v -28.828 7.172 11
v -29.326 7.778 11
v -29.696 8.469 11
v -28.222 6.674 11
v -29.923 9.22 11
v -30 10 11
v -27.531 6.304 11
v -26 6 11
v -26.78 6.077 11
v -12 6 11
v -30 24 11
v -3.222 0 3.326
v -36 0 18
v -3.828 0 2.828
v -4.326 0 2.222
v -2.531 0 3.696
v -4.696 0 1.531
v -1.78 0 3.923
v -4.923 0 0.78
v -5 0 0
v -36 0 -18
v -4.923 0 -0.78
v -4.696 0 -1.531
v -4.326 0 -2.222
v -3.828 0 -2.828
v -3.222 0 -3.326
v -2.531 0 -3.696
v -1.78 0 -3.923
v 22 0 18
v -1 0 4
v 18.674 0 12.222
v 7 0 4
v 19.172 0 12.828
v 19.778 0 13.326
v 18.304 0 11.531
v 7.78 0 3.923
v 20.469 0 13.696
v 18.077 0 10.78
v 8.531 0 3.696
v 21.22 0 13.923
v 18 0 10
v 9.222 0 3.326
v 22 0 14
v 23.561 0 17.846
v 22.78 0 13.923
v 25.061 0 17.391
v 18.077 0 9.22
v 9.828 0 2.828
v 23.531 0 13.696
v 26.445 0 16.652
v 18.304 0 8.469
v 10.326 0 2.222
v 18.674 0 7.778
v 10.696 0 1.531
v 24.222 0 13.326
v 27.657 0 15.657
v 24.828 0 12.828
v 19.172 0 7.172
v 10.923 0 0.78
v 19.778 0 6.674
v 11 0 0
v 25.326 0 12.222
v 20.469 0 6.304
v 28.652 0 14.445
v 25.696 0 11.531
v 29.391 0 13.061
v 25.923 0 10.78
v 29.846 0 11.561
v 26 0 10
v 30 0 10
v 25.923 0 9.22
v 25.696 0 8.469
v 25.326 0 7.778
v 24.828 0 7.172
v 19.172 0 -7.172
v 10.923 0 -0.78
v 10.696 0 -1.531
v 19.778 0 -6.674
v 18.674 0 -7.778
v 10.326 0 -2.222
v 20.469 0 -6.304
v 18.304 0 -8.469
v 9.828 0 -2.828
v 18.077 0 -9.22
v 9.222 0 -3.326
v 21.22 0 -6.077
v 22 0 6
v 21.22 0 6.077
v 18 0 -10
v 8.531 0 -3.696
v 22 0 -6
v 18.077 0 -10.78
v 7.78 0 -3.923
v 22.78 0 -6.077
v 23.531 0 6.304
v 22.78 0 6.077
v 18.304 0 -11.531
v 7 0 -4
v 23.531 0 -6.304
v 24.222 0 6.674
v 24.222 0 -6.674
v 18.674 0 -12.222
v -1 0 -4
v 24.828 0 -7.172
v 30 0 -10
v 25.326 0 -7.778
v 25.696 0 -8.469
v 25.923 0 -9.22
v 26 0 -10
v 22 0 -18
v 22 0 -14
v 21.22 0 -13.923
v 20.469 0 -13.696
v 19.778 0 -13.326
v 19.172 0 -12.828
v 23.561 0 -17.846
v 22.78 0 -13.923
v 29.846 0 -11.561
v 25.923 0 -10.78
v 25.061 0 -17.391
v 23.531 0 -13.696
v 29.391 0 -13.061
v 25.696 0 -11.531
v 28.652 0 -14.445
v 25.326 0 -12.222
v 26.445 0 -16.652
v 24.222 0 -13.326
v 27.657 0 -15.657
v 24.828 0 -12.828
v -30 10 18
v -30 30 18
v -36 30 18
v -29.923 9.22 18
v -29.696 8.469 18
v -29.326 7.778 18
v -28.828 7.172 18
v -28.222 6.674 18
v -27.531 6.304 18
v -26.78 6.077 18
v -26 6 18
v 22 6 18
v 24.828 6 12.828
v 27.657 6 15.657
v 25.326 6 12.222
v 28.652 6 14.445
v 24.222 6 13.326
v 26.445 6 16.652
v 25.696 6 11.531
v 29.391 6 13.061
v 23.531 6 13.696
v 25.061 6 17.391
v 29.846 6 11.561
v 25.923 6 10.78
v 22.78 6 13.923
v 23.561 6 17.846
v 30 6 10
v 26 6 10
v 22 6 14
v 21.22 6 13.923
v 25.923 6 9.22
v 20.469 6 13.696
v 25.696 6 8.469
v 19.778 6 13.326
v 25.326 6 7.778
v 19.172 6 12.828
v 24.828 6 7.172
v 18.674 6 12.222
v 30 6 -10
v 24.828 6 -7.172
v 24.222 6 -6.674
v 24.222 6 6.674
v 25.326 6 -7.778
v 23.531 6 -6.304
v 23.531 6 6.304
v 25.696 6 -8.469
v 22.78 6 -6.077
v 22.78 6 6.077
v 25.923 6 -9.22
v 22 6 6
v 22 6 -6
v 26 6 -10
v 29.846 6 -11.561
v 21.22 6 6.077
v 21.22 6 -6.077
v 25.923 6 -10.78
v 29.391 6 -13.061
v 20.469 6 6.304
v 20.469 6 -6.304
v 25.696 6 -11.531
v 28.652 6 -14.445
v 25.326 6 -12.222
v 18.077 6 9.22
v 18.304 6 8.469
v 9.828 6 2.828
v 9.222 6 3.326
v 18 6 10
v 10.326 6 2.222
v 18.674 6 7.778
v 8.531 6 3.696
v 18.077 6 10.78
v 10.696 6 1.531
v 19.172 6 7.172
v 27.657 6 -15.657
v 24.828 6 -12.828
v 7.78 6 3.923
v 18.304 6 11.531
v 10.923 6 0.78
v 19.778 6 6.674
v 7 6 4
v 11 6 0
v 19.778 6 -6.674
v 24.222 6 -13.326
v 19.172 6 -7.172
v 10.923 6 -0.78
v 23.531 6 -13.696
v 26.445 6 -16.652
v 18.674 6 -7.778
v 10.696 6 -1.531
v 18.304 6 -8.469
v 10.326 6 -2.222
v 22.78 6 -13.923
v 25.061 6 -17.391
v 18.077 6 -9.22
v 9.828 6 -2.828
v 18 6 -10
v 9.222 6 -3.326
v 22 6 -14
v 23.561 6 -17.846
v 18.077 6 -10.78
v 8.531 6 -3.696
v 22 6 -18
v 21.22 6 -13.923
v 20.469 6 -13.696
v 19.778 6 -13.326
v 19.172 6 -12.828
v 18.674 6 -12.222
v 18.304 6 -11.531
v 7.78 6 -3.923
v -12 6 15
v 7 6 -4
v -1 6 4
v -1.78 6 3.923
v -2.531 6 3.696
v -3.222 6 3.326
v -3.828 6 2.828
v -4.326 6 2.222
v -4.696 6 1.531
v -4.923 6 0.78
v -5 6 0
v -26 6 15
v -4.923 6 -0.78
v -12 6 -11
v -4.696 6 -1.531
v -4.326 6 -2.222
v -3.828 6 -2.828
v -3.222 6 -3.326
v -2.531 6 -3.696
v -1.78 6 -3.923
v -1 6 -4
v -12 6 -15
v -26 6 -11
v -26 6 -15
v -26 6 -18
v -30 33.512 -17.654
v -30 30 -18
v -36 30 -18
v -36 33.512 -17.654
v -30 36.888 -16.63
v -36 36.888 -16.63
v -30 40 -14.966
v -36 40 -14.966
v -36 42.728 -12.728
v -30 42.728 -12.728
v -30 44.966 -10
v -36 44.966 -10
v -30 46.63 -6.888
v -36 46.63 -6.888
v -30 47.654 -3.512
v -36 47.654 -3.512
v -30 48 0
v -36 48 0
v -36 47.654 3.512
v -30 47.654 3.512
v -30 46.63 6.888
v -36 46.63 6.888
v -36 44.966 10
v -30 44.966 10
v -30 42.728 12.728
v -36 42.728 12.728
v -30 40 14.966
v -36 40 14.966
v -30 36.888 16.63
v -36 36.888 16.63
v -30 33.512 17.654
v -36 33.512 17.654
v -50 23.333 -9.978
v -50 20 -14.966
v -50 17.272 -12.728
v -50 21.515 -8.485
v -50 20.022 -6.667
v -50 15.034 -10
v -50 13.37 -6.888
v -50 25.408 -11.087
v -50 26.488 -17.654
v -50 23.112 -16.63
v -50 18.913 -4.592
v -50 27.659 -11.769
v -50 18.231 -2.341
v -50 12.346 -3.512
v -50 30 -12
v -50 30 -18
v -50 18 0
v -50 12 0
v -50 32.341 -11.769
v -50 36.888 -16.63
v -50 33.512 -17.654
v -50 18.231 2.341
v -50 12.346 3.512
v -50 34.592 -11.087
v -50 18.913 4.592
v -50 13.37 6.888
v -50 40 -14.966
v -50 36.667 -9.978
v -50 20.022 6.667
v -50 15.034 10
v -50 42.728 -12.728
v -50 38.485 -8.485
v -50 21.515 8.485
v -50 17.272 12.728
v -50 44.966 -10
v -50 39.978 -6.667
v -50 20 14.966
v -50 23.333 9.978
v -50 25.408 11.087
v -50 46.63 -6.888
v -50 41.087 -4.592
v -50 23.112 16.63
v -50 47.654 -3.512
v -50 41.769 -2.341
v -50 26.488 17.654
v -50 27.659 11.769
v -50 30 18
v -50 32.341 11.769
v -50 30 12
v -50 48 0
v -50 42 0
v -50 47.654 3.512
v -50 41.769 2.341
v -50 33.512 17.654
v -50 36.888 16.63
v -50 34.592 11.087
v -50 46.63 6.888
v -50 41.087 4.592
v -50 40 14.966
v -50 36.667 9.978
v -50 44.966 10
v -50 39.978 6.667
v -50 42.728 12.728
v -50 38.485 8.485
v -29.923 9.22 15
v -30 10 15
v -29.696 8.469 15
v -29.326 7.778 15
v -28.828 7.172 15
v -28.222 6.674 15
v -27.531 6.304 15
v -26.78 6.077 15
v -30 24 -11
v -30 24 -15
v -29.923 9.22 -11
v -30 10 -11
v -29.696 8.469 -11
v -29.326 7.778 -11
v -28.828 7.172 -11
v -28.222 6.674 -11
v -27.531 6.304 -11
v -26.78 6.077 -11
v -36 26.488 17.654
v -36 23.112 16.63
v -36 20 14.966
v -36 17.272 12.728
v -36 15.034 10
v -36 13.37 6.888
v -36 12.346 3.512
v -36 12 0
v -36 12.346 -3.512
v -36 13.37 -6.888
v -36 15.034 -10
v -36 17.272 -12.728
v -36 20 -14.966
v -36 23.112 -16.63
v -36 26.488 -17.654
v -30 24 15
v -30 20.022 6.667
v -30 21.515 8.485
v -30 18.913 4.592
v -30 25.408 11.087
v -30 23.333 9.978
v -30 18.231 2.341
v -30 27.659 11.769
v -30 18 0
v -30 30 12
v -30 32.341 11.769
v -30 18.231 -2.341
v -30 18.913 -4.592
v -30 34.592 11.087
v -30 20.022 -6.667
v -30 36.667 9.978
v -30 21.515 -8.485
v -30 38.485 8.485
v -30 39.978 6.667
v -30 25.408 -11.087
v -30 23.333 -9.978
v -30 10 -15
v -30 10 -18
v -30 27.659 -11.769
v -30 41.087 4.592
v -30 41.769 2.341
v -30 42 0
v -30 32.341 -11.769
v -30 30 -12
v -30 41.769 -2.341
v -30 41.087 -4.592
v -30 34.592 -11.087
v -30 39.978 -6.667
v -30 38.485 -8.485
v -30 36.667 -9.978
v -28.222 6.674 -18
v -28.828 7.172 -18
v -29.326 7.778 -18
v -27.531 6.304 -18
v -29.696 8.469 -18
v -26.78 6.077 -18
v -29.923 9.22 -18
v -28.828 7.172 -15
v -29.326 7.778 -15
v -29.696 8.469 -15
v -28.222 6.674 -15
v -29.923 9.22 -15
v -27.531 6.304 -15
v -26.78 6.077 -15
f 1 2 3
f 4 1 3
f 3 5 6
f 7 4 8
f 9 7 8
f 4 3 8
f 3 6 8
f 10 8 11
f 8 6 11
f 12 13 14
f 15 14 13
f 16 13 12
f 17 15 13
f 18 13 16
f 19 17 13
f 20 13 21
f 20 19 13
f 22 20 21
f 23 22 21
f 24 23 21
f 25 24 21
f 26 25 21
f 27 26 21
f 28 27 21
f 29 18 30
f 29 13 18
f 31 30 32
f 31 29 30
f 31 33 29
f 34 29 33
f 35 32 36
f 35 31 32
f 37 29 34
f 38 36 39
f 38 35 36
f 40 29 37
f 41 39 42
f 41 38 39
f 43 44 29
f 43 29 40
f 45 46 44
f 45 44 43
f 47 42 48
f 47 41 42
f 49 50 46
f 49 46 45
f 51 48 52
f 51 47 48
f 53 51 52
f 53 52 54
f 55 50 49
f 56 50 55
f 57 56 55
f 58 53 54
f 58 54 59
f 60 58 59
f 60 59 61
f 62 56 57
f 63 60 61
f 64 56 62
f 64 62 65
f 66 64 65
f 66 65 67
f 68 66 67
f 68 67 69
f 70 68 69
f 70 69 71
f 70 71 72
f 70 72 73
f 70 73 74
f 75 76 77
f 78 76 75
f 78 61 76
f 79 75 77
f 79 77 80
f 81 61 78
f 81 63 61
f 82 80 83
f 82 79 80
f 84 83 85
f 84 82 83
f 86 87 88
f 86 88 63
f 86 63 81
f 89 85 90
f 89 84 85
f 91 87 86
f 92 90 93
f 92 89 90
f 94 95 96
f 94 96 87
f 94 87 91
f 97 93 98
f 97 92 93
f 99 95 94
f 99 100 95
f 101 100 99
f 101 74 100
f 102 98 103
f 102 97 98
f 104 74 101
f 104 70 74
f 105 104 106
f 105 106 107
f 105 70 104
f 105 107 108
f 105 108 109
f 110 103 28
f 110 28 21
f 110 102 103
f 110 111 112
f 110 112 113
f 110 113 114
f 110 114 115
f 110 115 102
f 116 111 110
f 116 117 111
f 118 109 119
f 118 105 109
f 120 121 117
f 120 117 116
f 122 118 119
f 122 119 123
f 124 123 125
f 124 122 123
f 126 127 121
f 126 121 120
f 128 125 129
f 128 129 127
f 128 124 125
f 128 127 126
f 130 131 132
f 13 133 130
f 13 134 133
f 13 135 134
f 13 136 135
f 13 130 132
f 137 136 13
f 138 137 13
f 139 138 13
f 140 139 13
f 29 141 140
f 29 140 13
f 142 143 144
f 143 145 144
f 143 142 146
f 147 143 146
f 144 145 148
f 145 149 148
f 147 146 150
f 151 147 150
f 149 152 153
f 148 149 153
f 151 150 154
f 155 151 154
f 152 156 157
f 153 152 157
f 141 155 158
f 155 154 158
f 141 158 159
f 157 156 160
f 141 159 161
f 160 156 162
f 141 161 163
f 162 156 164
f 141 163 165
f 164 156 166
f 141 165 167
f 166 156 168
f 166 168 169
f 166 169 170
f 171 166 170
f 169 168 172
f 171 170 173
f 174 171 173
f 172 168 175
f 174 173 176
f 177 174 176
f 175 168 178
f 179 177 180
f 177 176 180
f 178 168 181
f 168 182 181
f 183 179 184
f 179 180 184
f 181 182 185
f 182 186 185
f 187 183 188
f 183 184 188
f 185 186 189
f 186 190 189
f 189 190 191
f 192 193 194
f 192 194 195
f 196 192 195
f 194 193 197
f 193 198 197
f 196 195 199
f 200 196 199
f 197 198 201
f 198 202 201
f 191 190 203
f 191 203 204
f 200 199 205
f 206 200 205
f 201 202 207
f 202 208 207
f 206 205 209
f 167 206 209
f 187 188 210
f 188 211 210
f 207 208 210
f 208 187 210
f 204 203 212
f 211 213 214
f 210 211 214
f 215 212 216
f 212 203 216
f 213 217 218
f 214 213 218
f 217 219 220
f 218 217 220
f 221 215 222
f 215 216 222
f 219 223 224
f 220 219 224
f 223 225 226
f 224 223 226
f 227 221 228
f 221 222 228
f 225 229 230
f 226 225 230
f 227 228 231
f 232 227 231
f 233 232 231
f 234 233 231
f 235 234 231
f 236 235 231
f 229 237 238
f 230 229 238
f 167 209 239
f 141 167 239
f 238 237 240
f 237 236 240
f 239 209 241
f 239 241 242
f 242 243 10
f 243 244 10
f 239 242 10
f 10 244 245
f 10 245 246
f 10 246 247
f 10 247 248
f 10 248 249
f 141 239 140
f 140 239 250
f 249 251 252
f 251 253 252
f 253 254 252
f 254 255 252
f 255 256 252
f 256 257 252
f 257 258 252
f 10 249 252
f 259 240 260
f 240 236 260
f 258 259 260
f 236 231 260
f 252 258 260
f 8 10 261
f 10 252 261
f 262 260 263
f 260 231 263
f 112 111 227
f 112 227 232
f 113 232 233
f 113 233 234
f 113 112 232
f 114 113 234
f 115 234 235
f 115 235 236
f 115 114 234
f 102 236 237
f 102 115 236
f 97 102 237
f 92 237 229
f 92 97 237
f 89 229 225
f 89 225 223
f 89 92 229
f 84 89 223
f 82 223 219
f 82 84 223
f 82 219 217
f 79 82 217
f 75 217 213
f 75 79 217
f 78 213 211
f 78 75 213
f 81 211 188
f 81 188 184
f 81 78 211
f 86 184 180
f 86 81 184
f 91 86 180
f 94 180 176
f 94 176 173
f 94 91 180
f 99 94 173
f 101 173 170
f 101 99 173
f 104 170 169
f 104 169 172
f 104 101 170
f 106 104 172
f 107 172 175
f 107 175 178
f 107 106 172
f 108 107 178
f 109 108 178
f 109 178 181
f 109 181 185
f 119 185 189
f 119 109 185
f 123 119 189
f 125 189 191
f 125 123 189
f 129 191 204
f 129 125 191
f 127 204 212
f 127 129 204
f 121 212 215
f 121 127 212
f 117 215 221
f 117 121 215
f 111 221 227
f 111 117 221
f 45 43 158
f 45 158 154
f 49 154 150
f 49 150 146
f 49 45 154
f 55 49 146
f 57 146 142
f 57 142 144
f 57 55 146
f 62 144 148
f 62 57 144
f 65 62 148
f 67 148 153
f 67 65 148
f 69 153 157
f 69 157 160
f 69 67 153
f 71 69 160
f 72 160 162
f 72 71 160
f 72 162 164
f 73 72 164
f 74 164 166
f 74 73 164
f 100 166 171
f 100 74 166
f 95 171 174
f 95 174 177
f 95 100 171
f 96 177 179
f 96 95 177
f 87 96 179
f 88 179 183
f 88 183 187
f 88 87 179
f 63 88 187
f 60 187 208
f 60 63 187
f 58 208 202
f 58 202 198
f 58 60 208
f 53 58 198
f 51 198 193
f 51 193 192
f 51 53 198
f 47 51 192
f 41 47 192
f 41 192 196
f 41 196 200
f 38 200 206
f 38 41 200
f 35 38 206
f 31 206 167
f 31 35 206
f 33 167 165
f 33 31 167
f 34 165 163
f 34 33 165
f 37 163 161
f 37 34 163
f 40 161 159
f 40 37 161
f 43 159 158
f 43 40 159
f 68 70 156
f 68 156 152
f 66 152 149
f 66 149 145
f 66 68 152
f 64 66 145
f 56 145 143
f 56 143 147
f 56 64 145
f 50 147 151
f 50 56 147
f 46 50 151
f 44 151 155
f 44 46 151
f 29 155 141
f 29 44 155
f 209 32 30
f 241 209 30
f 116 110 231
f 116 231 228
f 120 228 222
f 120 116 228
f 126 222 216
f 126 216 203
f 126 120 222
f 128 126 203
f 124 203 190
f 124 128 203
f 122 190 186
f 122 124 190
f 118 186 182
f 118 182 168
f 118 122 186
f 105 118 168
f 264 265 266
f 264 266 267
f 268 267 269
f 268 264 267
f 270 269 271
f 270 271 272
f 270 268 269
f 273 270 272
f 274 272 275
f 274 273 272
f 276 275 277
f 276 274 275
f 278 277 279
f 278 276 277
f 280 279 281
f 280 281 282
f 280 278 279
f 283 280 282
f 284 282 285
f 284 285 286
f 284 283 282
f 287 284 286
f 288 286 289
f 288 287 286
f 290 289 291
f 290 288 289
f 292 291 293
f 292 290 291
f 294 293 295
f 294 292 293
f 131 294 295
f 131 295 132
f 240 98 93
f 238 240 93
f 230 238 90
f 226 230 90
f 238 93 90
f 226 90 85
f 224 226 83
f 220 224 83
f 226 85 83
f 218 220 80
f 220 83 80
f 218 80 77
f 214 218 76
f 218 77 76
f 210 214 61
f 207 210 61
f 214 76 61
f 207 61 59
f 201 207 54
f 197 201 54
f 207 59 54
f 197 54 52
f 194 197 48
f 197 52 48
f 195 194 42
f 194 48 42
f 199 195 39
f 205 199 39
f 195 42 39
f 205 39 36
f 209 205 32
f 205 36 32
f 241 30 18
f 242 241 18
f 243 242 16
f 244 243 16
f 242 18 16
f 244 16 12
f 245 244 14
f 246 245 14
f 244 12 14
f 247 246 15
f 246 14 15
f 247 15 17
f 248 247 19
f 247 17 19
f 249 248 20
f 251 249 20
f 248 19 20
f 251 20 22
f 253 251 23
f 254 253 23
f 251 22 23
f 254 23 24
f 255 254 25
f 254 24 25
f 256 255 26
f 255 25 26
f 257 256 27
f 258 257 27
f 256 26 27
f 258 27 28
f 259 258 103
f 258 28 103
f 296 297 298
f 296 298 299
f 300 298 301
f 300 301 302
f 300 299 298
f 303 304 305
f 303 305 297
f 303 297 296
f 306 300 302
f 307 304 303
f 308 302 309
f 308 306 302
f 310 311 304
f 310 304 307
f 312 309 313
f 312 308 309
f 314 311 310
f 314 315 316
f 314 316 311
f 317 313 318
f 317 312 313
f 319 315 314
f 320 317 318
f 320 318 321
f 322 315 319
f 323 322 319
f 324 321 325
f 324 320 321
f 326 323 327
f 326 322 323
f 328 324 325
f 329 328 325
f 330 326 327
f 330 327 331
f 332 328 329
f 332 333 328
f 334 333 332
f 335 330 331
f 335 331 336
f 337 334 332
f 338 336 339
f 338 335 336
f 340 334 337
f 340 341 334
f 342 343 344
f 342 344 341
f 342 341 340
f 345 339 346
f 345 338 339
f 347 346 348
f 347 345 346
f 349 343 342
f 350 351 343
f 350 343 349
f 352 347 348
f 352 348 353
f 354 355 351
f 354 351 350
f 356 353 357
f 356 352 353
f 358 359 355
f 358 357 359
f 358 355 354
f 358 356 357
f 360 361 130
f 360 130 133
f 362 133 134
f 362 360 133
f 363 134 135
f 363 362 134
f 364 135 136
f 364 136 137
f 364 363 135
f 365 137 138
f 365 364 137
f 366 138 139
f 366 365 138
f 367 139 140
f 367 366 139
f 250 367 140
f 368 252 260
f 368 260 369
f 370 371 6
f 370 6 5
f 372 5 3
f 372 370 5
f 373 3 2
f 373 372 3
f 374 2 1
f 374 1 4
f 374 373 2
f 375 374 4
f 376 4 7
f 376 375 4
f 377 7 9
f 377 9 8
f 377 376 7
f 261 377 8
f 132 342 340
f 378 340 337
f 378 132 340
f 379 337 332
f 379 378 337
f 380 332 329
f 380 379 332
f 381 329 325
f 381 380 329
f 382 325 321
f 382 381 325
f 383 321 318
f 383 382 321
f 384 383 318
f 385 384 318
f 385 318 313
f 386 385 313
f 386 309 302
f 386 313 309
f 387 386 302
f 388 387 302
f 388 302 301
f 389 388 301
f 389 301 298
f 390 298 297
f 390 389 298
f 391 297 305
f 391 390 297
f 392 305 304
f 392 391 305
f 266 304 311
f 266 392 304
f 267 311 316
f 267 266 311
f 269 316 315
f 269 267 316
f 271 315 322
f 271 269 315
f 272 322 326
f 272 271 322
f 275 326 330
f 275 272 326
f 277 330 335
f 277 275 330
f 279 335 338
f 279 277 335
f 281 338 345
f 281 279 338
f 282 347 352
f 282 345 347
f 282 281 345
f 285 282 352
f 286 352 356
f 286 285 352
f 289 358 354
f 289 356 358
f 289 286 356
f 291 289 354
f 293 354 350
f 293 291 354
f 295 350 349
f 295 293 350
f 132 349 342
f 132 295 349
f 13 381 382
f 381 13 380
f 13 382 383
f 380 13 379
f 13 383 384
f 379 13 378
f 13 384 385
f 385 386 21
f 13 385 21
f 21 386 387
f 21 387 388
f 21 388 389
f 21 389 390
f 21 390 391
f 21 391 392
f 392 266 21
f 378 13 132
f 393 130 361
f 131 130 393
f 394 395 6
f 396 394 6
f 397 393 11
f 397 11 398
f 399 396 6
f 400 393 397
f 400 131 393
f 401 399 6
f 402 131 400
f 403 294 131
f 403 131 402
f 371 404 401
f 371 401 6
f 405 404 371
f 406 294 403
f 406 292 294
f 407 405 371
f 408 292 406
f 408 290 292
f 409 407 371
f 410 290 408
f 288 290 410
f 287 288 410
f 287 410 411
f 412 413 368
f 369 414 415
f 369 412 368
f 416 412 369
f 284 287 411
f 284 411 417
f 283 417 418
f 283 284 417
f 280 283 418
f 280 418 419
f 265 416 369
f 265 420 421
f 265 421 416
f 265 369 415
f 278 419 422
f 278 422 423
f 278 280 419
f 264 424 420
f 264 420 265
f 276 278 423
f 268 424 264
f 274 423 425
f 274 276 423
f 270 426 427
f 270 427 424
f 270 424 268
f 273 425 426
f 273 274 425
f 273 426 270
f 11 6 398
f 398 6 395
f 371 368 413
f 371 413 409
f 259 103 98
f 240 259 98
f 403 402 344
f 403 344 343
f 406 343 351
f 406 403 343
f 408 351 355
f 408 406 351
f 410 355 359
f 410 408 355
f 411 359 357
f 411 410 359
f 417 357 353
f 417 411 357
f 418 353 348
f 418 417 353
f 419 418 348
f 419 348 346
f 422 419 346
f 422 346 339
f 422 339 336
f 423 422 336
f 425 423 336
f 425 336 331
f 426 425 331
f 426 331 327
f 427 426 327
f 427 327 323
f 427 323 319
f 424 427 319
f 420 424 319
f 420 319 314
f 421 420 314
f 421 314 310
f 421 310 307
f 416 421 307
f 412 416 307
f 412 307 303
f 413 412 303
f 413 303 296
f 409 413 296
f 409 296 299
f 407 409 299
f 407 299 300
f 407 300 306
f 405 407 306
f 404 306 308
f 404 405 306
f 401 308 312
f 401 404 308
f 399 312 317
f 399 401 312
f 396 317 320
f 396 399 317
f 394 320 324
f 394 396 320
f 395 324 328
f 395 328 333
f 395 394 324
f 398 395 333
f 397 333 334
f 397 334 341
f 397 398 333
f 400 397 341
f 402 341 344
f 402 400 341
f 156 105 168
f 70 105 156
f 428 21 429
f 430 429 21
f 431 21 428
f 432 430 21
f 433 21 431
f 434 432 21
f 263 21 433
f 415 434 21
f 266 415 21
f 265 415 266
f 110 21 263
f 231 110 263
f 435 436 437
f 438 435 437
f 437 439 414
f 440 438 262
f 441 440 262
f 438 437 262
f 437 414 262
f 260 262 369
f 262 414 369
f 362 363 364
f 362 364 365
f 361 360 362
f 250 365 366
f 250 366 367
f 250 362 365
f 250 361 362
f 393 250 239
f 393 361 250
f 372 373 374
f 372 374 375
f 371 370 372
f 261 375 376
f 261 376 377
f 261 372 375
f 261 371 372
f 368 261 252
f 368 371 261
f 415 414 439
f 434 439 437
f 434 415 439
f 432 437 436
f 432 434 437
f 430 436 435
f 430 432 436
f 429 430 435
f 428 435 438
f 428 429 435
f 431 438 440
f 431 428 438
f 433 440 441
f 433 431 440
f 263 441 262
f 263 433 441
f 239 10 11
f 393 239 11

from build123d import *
from build123d.topology import SkipClean

# Parameters (mm, degrees)
SKETCH1_R           = 4
BOSS_EXTRUDE1_DEPTH = 6
SKETCH2_R           = 12
BOSS_EXTRUDE2_DEPTH = 6
SKETCH3_R           = 18
SKETCH3_R_2         = 12
BOSS_EXTRUDE3_DEPTH = 14
FILLET1_R           = 4
BOSS_EXTRUDE4_START = -4
BOSS_EXTRUDE4_DEPTH = 4


with BuildPart() as part:
    # Sketch1 → Boss-Extrude1 (new body)
    with BuildSketch(Plane(origin=(0, 0, 0), x_dir=(1, 0, 0), z_dir=(0, 1, 0))):
        with BuildLine():
            Line((-30, 18), (22, 18))
            ThreePointArc((22, 18), (27.656854249, 15.656854249), (30, 10))
            Line((30, 10), (30, -10))
            ThreePointArc((30, -10), (27.656854249, -15.656854249), (22, -18))
            Line((22, -18), (-30, -18))
            Line((-30, -18), (-30, 18))
        make_face()
        with Locations((22, -10)):
            Circle(SKETCH1_R, mode=Mode.SUBTRACT)
        with Locations((22, 10)):
            Circle(SKETCH1_R, mode=Mode.SUBTRACT)
        with BuildLine():
            Line((-1, 4), (7, 4))
            ThreePointArc((7, 4), (11, 0), (7, -4))
            Line((7, -4), (-1, -4))
            ThreePointArc((-1, -4), (-5, 0), (-1, 4))
        make_face(mode=Mode.SUBTRACT)
    extrude(amount=BOSS_EXTRUDE1_DEPTH)

    # Sketch2 → Boss-Extrude2 (add)
    with BuildSketch(Plane.ZY.offset(30)):
        with BuildLine():
            Line((-18, 0), (-18, 30))
            ThreePointArc((-18, 30), (0, 48), (18, 30))
            Line((18, 30), (18, 0))
            Line((18, 0), (-18, 0))
        make_face()
        with Locations((0, 30)):
            Circle(SKETCH2_R, mode=Mode.SUBTRACT)
    extrude(amount=BOSS_EXTRUDE2_DEPTH)

    # Sketch3 → Boss-Extrude3 (add)
    with SkipClean():  # the faces are left unmerged after this step: merging them gives an invalid solid
        with BuildSketch(Plane.ZY.offset(36)):
            with Locations((0, 30)):
                Circle(SKETCH3_R)
            with Locations((0, 30)):
                Circle(SKETCH3_R_2, mode=Mode.SUBTRACT)
        extrude(amount=BOSS_EXTRUDE3_DEPTH)
    add(part.part.scale(1), mode=Mode.REPLACE)  # the faces are merged on a copy

    # Fillet1
    fillet1_edges = [part.edges().sort_by_distance(p)[0] for p in [
        (-30, 6, 0),
    ]]
    fillet(fillet1_edges, radius=FILLET1_R)

    # Sketch4 → Boss-Extrude4 (add)
    with BuildSketch(Plane.XY.offset(15).offset(BOSS_EXTRUDE4_START)):
        with BuildLine():
            Line((-26, 6), (-12, 6))
            Line((-12, 6), (-30, 24))
            Line((-30, 24), (-30, 10))
            ThreePointArc((-30, 10), (-28.828427125, 7.171572875), (-26, 6))
        make_face()
    boss_extrude4 = extrude(amount=BOSS_EXTRUDE4_DEPTH)

    # Mirror1: Boss-Extrude4 across plane
    add(boss_extrude4.mirror(Plane(origin=(0, 0, 0), x_dir=(1, 0, 0), z_dir=(0, 0, -1))))


solid = part.part
